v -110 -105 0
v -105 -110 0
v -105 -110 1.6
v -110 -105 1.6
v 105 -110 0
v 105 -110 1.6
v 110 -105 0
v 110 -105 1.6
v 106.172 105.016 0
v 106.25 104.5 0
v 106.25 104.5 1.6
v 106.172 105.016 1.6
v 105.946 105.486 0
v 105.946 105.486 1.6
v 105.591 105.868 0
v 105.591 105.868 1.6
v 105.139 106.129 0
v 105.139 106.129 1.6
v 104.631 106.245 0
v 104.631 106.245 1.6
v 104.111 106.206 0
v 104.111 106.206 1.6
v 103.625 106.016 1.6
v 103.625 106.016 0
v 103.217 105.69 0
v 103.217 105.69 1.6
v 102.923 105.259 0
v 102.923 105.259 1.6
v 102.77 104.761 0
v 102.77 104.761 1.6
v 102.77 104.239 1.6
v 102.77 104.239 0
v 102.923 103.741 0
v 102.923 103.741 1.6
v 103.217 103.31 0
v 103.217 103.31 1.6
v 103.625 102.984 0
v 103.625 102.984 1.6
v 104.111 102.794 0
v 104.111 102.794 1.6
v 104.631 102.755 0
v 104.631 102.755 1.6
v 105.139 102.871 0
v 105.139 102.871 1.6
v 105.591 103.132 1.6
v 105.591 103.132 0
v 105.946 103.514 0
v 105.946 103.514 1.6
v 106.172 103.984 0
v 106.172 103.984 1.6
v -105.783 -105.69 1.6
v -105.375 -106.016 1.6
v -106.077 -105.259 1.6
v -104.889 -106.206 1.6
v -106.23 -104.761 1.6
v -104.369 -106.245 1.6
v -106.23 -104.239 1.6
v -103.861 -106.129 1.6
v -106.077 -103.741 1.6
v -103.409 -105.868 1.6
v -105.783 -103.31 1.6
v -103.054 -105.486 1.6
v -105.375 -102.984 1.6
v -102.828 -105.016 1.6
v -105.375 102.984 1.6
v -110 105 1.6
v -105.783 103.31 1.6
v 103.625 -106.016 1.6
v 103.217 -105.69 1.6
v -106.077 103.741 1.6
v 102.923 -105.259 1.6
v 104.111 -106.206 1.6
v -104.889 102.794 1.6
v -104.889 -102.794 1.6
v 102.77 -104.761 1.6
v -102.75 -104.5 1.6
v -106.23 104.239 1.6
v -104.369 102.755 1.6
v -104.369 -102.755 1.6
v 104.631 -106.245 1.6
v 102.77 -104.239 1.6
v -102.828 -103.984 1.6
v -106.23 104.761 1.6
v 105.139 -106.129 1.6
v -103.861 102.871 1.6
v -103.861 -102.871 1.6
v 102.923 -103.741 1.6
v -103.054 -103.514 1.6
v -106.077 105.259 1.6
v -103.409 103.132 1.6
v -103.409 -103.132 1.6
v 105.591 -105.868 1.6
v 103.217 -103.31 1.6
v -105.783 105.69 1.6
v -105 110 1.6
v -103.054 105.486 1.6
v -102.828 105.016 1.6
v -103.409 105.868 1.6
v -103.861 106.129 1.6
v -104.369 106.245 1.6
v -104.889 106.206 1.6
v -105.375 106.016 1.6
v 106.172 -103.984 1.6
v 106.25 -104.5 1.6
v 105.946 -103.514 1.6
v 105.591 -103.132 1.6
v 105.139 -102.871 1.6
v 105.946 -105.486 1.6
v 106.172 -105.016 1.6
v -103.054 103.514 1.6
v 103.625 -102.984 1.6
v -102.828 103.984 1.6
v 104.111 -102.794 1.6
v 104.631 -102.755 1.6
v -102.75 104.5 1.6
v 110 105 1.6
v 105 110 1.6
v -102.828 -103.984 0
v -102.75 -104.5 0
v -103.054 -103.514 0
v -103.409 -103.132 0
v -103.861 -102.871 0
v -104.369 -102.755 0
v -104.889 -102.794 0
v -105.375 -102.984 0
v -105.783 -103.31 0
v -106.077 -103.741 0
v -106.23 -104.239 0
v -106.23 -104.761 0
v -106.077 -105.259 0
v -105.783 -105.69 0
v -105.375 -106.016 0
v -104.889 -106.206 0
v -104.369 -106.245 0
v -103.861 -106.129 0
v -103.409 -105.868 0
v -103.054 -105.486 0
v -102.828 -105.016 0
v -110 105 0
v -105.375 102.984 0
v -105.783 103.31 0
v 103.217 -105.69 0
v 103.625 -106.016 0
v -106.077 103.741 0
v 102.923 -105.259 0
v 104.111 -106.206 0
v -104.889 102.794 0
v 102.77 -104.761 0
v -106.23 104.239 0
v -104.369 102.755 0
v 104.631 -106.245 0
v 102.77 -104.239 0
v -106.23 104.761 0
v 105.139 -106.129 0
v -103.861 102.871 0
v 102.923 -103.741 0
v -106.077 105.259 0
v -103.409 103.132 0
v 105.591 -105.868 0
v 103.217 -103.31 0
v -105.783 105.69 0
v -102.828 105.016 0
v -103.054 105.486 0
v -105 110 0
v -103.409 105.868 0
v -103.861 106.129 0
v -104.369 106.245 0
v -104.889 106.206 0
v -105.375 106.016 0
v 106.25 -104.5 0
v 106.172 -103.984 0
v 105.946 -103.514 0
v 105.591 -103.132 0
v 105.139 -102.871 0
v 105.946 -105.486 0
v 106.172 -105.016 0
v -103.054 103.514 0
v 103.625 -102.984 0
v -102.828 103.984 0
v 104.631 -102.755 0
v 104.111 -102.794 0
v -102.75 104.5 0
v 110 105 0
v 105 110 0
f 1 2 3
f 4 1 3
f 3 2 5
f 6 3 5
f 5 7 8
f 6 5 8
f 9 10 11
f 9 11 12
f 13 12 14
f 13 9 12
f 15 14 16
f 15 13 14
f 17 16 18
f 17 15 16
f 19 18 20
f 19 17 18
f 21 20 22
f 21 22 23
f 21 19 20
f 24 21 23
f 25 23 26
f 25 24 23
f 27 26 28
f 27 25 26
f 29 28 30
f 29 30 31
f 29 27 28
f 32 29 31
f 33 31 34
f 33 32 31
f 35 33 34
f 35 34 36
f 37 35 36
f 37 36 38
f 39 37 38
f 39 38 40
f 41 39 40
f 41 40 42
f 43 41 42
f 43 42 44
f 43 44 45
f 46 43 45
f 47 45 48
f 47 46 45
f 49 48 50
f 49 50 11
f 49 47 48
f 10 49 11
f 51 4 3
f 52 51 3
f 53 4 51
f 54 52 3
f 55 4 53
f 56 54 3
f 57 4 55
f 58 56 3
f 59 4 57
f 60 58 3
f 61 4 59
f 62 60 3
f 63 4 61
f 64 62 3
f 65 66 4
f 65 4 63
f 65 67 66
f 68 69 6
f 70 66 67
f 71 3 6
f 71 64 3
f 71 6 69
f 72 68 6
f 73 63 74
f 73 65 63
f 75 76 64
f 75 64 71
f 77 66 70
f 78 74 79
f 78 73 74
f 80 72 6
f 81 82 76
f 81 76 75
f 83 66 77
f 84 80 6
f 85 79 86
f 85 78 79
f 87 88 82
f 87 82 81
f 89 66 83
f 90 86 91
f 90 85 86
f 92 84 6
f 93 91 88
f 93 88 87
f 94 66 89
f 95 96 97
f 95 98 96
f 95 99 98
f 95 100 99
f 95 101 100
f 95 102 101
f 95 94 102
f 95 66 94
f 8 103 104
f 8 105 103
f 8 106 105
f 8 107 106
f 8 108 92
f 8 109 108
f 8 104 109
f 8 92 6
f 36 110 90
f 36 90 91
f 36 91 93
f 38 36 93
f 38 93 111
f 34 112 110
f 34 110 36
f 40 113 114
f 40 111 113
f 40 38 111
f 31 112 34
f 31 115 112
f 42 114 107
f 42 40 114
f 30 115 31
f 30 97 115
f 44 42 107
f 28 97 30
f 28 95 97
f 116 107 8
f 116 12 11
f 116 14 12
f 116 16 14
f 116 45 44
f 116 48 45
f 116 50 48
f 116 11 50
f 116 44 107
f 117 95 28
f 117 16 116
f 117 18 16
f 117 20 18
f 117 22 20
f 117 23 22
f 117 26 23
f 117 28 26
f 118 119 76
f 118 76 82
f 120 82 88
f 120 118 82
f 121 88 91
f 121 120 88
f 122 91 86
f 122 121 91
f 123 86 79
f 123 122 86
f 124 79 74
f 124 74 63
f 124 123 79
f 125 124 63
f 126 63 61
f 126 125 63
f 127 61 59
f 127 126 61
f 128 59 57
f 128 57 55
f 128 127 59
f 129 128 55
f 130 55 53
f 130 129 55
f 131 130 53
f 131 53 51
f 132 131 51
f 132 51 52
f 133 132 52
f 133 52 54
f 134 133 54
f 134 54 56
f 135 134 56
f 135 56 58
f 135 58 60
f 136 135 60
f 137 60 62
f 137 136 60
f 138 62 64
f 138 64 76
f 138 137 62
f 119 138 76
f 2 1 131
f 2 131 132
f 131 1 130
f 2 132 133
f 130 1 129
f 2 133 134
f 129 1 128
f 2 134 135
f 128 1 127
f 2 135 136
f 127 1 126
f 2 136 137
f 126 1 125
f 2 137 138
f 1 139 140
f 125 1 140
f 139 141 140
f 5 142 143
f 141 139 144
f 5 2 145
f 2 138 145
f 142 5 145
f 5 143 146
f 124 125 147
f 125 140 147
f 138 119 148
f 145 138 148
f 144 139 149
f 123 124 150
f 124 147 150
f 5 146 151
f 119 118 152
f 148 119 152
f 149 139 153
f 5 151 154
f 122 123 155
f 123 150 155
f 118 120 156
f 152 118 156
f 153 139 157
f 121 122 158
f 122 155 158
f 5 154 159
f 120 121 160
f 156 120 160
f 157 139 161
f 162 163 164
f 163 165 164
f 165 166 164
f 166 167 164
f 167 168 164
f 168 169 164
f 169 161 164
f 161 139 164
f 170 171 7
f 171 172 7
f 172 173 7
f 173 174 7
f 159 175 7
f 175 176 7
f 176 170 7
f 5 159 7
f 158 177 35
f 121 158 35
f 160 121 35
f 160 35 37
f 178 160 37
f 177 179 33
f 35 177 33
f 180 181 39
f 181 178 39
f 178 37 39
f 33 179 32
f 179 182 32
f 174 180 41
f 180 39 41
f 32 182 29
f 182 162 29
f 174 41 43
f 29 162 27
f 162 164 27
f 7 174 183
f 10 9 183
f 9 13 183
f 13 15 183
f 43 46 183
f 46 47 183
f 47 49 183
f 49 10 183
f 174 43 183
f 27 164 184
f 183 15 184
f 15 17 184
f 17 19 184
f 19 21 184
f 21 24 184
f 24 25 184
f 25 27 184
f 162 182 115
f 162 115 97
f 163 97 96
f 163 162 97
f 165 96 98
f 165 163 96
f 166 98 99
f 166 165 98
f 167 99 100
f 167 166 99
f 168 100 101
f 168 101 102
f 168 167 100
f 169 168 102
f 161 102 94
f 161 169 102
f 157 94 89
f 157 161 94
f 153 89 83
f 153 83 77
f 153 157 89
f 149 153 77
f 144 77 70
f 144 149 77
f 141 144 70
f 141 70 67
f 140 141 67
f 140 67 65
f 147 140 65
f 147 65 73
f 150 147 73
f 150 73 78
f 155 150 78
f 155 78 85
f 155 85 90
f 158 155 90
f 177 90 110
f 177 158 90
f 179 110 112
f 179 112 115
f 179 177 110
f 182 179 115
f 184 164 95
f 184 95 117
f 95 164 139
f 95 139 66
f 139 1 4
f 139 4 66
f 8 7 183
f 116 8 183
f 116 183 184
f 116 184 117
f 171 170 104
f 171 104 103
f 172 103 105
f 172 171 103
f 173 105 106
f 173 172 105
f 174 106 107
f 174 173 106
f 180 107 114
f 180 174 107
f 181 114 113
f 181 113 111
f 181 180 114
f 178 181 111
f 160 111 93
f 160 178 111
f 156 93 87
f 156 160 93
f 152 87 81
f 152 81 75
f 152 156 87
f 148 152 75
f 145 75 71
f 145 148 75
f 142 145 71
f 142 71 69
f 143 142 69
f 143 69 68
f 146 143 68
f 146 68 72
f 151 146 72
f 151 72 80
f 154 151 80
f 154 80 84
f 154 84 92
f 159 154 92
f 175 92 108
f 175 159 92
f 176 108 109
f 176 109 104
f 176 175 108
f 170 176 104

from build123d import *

# Parameters (mm, degrees)
SZKIC1_W                    = 220
SZKIC1_H                    = 220
SZKIC1_R                    = 1.75
DODANIE_WYCI_GNI_CIE1_DEPTH = 1.6
SFAZOWANIE1_SIZE            = 5


with BuildPart() as part:
    # Szkic1 → Dodanie-wyciągnięcie1 (new body)
    with BuildSketch(Plane.XY):
        Rectangle(SZKIC1_W, SZKIC1_H)
        with Locations((104.5, 104.5)):
            Circle(SZKIC1_R, mode=Mode.SUBTRACT)
        with Locations((-104.5, 104.5)):
            Circle(SZKIC1_R, mode=Mode.SUBTRACT)
        with Locations((-104.5, -104.5)):
            Circle(SZKIC1_R, mode=Mode.SUBTRACT)
        with Locations((104.5, -104.5)):
            Circle(SZKIC1_R, mode=Mode.SUBTRACT)
    extrude(amount=DODANIE_WYCI_GNI_CIE1_DEPTH)

    # Sfazowanie1
    sfazowanie1_edges = [part.edges().sort_by_distance(p)[0] for p in [
        (110, -110, 0.8),
        (-110, -110, 0.8),
        (-110, 110, 0.8),
        (110, 110, 0.8),
    ]]
    chamfer(sfazowanie1_edges, length=SFAZOWANIE1_SIZE)


solid = part.part
